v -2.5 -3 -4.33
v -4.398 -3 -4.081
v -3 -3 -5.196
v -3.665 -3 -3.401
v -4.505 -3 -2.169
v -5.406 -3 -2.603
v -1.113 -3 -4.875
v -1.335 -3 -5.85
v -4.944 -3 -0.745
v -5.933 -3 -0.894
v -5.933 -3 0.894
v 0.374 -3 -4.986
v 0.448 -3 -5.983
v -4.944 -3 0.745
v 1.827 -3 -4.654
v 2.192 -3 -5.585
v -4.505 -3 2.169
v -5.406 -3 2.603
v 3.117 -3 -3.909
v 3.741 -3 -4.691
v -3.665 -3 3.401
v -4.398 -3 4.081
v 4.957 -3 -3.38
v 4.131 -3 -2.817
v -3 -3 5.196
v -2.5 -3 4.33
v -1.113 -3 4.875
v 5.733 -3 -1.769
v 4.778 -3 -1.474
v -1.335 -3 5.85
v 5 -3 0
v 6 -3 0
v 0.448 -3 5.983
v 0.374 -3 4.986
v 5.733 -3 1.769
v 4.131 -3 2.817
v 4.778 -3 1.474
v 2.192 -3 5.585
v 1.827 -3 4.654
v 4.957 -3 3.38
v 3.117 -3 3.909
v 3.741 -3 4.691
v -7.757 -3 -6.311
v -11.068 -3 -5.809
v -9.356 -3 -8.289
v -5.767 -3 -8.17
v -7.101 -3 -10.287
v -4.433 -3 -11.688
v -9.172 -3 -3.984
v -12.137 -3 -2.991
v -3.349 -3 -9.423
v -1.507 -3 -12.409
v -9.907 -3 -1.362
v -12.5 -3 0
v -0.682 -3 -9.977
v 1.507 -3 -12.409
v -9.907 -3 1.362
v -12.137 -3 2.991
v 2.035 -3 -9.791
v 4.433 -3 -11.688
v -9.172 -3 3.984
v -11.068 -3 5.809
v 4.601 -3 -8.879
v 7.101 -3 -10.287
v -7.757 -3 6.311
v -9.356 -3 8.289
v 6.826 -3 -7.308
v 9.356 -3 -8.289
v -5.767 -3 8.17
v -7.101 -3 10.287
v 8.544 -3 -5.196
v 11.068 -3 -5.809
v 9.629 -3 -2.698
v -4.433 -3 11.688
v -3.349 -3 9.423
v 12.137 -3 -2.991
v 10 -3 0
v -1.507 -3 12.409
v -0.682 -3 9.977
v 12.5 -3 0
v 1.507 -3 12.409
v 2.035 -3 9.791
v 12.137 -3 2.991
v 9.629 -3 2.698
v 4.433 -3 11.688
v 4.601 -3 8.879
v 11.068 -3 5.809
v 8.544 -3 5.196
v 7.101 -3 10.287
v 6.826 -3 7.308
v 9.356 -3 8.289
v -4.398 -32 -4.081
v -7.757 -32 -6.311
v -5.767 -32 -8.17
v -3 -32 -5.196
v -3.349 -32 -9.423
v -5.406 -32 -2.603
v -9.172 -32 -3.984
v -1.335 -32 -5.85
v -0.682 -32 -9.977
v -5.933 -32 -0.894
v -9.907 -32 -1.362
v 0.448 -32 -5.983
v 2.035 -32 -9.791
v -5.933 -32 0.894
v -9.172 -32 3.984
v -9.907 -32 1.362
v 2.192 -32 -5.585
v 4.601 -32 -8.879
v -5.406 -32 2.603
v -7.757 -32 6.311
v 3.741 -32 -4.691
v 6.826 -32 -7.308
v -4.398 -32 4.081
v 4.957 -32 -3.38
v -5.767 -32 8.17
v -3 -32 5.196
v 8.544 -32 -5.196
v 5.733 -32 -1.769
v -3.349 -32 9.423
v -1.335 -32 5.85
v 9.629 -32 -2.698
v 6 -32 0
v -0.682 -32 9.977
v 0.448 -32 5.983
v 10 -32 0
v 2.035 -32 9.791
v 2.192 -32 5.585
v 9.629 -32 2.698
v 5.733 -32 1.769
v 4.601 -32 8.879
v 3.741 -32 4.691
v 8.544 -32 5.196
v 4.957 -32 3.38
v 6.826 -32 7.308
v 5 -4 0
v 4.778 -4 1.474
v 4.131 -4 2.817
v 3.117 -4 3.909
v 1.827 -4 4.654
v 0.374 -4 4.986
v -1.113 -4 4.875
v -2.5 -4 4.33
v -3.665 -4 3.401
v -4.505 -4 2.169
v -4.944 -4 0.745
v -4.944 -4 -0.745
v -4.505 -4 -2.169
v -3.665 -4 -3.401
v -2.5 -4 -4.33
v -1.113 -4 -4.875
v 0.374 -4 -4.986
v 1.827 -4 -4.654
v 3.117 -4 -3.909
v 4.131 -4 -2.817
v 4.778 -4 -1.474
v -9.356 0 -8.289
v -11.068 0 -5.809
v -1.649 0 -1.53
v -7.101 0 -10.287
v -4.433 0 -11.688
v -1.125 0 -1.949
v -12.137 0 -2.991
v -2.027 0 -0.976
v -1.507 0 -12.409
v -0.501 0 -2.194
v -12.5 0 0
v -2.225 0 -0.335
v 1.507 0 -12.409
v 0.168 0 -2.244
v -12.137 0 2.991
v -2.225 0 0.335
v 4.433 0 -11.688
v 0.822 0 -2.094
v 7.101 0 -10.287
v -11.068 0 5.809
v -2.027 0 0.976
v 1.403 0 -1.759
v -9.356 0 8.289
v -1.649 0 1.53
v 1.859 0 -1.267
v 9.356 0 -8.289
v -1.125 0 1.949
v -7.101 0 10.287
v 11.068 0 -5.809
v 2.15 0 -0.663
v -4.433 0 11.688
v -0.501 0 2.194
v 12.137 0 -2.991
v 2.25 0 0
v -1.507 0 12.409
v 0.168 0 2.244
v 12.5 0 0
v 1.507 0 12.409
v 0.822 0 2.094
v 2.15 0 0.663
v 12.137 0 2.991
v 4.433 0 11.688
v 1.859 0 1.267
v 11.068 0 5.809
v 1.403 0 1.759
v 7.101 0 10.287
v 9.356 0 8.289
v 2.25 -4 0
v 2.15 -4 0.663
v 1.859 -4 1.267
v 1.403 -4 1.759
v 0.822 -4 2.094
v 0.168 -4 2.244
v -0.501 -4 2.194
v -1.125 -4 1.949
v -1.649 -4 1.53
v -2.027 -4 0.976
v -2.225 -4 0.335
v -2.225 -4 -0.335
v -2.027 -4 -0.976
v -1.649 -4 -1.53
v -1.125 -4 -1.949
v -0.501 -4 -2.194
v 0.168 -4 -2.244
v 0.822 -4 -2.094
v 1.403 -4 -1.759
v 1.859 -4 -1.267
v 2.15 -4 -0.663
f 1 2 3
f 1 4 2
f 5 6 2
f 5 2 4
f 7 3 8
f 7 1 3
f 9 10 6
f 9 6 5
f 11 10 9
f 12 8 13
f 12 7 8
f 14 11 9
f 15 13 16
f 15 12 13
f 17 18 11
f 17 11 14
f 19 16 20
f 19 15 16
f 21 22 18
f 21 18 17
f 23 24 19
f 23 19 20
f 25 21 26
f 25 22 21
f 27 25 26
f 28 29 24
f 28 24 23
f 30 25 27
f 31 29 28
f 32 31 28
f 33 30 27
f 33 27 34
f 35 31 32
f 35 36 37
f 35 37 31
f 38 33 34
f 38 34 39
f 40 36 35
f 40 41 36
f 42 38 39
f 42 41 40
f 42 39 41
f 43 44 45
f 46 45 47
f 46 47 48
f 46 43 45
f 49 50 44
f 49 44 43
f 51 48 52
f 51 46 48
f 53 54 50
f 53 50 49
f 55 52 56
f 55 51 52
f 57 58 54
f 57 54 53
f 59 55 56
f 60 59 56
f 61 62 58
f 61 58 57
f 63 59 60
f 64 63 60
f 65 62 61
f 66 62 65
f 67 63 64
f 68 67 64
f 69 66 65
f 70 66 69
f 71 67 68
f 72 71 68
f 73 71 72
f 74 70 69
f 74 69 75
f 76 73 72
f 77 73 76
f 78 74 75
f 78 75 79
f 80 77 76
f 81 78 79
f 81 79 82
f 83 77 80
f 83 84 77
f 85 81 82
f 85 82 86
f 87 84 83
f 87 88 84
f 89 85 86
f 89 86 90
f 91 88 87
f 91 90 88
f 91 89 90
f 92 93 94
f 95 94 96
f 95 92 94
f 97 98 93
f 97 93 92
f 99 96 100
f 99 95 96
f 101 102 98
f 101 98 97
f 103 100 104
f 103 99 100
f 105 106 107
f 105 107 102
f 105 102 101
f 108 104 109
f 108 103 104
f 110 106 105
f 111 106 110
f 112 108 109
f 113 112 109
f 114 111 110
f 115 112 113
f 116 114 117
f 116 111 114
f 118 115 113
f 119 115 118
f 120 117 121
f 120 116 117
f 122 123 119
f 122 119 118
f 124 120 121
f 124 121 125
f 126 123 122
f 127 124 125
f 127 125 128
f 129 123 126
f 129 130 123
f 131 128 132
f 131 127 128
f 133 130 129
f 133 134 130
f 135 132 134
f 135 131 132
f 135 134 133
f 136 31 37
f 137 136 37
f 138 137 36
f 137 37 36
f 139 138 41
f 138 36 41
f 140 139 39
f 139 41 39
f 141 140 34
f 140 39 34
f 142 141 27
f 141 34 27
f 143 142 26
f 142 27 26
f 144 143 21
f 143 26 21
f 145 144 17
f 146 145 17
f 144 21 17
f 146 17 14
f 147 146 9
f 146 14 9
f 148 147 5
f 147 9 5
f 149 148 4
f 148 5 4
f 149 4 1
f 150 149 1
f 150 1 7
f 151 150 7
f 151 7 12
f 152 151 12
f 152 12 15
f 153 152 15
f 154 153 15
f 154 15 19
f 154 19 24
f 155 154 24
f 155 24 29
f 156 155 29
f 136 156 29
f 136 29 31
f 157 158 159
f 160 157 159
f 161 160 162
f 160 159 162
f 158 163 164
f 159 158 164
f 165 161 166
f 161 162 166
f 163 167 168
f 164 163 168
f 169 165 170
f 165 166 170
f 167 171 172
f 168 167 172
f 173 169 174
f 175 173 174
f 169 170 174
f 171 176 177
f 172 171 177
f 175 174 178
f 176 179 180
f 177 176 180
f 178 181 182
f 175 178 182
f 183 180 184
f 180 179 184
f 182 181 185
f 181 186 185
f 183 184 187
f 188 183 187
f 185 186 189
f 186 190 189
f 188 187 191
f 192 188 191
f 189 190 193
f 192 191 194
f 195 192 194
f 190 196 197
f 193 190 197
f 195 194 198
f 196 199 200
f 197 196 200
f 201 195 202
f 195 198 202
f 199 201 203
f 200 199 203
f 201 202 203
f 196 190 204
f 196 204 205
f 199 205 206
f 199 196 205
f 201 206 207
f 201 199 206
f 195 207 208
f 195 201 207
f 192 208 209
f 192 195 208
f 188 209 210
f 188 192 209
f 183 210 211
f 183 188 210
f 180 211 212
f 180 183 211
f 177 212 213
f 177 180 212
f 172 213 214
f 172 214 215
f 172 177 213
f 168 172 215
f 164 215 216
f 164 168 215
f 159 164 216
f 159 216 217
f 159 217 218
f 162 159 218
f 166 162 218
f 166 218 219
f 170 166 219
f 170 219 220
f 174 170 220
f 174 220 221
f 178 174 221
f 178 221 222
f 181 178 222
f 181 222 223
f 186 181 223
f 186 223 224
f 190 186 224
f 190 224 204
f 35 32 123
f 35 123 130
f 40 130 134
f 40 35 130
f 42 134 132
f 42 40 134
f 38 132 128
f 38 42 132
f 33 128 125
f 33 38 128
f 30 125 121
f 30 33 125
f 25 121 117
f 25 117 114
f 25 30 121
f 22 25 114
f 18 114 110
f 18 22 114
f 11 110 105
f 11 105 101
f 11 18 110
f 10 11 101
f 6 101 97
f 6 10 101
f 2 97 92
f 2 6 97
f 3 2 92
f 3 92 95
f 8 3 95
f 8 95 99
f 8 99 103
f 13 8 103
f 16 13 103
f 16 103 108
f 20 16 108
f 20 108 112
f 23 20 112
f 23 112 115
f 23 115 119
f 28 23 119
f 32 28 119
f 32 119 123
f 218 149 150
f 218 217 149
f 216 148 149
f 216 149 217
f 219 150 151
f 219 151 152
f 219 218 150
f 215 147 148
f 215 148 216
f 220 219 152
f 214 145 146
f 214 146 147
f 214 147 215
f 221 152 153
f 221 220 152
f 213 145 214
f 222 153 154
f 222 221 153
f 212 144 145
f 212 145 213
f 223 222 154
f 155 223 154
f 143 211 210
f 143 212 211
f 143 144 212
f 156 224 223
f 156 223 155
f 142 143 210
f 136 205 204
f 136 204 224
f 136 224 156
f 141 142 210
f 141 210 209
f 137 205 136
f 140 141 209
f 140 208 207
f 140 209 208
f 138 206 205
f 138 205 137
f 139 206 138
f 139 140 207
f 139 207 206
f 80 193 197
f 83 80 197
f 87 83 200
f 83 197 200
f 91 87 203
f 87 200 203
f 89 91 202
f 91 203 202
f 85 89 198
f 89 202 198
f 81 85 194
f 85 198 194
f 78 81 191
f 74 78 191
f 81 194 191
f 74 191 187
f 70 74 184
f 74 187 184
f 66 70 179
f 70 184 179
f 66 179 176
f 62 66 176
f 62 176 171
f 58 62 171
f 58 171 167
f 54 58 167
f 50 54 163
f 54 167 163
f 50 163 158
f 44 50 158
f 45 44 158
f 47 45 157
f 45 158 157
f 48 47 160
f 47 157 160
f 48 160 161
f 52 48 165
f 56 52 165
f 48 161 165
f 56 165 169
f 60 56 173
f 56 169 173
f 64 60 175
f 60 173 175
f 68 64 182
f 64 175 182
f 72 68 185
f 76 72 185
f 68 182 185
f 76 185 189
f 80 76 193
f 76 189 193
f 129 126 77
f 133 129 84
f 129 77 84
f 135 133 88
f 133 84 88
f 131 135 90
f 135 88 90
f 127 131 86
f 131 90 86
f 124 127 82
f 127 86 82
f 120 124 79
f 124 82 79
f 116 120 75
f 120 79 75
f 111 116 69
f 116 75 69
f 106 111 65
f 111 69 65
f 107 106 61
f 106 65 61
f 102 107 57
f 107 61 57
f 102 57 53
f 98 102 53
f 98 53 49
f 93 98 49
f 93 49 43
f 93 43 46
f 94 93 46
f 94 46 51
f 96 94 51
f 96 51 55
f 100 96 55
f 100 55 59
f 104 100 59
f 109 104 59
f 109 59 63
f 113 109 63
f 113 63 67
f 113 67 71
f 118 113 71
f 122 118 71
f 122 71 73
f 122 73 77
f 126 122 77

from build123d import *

# Parameters (mm, degrees)
F0_R     = 12.5
F0_R_2   = 10
F0_R_3   = 6
F0_R_4   = 5
F0_R_5   = 2.25
F1_DEPTH = 3
F2_DEPTH = 4
F3_DEPTH = 32


with BuildPart() as f1:
    # F0 (on Front) → F1 (new body)
    with BuildSketch(Plane.XZ):
        Circle(F0_R)
        Circle(F0_R_2, mode=Mode.SUBTRACT)
        Circle(F0_R_2)
        Circle(F0_R_3, mode=Mode.SUBTRACT)
        Circle(F0_R_3)
        Circle(F0_R_4, mode=Mode.SUBTRACT)
        Circle(F0_R_4)
        Circle(F0_R_5, mode=Mode.SUBTRACT)
    extrude(amount=F1_DEPTH)

    # F0 (on Front) → F2 (join)
    with BuildSketch(Plane.XZ):
        Circle(F0_R_4)
        Circle(F0_R_5, mode=Mode.SUBTRACT)
    extrude(amount=F2_DEPTH)

    # F0 (on Front) → F3 (join)
    with BuildSketch(Plane.XZ):
        Circle(F0_R_2)
        Circle(F0_R_3, mode=Mode.SUBTRACT)
    extrude(amount=F3_DEPTH)


solid = f1.part
